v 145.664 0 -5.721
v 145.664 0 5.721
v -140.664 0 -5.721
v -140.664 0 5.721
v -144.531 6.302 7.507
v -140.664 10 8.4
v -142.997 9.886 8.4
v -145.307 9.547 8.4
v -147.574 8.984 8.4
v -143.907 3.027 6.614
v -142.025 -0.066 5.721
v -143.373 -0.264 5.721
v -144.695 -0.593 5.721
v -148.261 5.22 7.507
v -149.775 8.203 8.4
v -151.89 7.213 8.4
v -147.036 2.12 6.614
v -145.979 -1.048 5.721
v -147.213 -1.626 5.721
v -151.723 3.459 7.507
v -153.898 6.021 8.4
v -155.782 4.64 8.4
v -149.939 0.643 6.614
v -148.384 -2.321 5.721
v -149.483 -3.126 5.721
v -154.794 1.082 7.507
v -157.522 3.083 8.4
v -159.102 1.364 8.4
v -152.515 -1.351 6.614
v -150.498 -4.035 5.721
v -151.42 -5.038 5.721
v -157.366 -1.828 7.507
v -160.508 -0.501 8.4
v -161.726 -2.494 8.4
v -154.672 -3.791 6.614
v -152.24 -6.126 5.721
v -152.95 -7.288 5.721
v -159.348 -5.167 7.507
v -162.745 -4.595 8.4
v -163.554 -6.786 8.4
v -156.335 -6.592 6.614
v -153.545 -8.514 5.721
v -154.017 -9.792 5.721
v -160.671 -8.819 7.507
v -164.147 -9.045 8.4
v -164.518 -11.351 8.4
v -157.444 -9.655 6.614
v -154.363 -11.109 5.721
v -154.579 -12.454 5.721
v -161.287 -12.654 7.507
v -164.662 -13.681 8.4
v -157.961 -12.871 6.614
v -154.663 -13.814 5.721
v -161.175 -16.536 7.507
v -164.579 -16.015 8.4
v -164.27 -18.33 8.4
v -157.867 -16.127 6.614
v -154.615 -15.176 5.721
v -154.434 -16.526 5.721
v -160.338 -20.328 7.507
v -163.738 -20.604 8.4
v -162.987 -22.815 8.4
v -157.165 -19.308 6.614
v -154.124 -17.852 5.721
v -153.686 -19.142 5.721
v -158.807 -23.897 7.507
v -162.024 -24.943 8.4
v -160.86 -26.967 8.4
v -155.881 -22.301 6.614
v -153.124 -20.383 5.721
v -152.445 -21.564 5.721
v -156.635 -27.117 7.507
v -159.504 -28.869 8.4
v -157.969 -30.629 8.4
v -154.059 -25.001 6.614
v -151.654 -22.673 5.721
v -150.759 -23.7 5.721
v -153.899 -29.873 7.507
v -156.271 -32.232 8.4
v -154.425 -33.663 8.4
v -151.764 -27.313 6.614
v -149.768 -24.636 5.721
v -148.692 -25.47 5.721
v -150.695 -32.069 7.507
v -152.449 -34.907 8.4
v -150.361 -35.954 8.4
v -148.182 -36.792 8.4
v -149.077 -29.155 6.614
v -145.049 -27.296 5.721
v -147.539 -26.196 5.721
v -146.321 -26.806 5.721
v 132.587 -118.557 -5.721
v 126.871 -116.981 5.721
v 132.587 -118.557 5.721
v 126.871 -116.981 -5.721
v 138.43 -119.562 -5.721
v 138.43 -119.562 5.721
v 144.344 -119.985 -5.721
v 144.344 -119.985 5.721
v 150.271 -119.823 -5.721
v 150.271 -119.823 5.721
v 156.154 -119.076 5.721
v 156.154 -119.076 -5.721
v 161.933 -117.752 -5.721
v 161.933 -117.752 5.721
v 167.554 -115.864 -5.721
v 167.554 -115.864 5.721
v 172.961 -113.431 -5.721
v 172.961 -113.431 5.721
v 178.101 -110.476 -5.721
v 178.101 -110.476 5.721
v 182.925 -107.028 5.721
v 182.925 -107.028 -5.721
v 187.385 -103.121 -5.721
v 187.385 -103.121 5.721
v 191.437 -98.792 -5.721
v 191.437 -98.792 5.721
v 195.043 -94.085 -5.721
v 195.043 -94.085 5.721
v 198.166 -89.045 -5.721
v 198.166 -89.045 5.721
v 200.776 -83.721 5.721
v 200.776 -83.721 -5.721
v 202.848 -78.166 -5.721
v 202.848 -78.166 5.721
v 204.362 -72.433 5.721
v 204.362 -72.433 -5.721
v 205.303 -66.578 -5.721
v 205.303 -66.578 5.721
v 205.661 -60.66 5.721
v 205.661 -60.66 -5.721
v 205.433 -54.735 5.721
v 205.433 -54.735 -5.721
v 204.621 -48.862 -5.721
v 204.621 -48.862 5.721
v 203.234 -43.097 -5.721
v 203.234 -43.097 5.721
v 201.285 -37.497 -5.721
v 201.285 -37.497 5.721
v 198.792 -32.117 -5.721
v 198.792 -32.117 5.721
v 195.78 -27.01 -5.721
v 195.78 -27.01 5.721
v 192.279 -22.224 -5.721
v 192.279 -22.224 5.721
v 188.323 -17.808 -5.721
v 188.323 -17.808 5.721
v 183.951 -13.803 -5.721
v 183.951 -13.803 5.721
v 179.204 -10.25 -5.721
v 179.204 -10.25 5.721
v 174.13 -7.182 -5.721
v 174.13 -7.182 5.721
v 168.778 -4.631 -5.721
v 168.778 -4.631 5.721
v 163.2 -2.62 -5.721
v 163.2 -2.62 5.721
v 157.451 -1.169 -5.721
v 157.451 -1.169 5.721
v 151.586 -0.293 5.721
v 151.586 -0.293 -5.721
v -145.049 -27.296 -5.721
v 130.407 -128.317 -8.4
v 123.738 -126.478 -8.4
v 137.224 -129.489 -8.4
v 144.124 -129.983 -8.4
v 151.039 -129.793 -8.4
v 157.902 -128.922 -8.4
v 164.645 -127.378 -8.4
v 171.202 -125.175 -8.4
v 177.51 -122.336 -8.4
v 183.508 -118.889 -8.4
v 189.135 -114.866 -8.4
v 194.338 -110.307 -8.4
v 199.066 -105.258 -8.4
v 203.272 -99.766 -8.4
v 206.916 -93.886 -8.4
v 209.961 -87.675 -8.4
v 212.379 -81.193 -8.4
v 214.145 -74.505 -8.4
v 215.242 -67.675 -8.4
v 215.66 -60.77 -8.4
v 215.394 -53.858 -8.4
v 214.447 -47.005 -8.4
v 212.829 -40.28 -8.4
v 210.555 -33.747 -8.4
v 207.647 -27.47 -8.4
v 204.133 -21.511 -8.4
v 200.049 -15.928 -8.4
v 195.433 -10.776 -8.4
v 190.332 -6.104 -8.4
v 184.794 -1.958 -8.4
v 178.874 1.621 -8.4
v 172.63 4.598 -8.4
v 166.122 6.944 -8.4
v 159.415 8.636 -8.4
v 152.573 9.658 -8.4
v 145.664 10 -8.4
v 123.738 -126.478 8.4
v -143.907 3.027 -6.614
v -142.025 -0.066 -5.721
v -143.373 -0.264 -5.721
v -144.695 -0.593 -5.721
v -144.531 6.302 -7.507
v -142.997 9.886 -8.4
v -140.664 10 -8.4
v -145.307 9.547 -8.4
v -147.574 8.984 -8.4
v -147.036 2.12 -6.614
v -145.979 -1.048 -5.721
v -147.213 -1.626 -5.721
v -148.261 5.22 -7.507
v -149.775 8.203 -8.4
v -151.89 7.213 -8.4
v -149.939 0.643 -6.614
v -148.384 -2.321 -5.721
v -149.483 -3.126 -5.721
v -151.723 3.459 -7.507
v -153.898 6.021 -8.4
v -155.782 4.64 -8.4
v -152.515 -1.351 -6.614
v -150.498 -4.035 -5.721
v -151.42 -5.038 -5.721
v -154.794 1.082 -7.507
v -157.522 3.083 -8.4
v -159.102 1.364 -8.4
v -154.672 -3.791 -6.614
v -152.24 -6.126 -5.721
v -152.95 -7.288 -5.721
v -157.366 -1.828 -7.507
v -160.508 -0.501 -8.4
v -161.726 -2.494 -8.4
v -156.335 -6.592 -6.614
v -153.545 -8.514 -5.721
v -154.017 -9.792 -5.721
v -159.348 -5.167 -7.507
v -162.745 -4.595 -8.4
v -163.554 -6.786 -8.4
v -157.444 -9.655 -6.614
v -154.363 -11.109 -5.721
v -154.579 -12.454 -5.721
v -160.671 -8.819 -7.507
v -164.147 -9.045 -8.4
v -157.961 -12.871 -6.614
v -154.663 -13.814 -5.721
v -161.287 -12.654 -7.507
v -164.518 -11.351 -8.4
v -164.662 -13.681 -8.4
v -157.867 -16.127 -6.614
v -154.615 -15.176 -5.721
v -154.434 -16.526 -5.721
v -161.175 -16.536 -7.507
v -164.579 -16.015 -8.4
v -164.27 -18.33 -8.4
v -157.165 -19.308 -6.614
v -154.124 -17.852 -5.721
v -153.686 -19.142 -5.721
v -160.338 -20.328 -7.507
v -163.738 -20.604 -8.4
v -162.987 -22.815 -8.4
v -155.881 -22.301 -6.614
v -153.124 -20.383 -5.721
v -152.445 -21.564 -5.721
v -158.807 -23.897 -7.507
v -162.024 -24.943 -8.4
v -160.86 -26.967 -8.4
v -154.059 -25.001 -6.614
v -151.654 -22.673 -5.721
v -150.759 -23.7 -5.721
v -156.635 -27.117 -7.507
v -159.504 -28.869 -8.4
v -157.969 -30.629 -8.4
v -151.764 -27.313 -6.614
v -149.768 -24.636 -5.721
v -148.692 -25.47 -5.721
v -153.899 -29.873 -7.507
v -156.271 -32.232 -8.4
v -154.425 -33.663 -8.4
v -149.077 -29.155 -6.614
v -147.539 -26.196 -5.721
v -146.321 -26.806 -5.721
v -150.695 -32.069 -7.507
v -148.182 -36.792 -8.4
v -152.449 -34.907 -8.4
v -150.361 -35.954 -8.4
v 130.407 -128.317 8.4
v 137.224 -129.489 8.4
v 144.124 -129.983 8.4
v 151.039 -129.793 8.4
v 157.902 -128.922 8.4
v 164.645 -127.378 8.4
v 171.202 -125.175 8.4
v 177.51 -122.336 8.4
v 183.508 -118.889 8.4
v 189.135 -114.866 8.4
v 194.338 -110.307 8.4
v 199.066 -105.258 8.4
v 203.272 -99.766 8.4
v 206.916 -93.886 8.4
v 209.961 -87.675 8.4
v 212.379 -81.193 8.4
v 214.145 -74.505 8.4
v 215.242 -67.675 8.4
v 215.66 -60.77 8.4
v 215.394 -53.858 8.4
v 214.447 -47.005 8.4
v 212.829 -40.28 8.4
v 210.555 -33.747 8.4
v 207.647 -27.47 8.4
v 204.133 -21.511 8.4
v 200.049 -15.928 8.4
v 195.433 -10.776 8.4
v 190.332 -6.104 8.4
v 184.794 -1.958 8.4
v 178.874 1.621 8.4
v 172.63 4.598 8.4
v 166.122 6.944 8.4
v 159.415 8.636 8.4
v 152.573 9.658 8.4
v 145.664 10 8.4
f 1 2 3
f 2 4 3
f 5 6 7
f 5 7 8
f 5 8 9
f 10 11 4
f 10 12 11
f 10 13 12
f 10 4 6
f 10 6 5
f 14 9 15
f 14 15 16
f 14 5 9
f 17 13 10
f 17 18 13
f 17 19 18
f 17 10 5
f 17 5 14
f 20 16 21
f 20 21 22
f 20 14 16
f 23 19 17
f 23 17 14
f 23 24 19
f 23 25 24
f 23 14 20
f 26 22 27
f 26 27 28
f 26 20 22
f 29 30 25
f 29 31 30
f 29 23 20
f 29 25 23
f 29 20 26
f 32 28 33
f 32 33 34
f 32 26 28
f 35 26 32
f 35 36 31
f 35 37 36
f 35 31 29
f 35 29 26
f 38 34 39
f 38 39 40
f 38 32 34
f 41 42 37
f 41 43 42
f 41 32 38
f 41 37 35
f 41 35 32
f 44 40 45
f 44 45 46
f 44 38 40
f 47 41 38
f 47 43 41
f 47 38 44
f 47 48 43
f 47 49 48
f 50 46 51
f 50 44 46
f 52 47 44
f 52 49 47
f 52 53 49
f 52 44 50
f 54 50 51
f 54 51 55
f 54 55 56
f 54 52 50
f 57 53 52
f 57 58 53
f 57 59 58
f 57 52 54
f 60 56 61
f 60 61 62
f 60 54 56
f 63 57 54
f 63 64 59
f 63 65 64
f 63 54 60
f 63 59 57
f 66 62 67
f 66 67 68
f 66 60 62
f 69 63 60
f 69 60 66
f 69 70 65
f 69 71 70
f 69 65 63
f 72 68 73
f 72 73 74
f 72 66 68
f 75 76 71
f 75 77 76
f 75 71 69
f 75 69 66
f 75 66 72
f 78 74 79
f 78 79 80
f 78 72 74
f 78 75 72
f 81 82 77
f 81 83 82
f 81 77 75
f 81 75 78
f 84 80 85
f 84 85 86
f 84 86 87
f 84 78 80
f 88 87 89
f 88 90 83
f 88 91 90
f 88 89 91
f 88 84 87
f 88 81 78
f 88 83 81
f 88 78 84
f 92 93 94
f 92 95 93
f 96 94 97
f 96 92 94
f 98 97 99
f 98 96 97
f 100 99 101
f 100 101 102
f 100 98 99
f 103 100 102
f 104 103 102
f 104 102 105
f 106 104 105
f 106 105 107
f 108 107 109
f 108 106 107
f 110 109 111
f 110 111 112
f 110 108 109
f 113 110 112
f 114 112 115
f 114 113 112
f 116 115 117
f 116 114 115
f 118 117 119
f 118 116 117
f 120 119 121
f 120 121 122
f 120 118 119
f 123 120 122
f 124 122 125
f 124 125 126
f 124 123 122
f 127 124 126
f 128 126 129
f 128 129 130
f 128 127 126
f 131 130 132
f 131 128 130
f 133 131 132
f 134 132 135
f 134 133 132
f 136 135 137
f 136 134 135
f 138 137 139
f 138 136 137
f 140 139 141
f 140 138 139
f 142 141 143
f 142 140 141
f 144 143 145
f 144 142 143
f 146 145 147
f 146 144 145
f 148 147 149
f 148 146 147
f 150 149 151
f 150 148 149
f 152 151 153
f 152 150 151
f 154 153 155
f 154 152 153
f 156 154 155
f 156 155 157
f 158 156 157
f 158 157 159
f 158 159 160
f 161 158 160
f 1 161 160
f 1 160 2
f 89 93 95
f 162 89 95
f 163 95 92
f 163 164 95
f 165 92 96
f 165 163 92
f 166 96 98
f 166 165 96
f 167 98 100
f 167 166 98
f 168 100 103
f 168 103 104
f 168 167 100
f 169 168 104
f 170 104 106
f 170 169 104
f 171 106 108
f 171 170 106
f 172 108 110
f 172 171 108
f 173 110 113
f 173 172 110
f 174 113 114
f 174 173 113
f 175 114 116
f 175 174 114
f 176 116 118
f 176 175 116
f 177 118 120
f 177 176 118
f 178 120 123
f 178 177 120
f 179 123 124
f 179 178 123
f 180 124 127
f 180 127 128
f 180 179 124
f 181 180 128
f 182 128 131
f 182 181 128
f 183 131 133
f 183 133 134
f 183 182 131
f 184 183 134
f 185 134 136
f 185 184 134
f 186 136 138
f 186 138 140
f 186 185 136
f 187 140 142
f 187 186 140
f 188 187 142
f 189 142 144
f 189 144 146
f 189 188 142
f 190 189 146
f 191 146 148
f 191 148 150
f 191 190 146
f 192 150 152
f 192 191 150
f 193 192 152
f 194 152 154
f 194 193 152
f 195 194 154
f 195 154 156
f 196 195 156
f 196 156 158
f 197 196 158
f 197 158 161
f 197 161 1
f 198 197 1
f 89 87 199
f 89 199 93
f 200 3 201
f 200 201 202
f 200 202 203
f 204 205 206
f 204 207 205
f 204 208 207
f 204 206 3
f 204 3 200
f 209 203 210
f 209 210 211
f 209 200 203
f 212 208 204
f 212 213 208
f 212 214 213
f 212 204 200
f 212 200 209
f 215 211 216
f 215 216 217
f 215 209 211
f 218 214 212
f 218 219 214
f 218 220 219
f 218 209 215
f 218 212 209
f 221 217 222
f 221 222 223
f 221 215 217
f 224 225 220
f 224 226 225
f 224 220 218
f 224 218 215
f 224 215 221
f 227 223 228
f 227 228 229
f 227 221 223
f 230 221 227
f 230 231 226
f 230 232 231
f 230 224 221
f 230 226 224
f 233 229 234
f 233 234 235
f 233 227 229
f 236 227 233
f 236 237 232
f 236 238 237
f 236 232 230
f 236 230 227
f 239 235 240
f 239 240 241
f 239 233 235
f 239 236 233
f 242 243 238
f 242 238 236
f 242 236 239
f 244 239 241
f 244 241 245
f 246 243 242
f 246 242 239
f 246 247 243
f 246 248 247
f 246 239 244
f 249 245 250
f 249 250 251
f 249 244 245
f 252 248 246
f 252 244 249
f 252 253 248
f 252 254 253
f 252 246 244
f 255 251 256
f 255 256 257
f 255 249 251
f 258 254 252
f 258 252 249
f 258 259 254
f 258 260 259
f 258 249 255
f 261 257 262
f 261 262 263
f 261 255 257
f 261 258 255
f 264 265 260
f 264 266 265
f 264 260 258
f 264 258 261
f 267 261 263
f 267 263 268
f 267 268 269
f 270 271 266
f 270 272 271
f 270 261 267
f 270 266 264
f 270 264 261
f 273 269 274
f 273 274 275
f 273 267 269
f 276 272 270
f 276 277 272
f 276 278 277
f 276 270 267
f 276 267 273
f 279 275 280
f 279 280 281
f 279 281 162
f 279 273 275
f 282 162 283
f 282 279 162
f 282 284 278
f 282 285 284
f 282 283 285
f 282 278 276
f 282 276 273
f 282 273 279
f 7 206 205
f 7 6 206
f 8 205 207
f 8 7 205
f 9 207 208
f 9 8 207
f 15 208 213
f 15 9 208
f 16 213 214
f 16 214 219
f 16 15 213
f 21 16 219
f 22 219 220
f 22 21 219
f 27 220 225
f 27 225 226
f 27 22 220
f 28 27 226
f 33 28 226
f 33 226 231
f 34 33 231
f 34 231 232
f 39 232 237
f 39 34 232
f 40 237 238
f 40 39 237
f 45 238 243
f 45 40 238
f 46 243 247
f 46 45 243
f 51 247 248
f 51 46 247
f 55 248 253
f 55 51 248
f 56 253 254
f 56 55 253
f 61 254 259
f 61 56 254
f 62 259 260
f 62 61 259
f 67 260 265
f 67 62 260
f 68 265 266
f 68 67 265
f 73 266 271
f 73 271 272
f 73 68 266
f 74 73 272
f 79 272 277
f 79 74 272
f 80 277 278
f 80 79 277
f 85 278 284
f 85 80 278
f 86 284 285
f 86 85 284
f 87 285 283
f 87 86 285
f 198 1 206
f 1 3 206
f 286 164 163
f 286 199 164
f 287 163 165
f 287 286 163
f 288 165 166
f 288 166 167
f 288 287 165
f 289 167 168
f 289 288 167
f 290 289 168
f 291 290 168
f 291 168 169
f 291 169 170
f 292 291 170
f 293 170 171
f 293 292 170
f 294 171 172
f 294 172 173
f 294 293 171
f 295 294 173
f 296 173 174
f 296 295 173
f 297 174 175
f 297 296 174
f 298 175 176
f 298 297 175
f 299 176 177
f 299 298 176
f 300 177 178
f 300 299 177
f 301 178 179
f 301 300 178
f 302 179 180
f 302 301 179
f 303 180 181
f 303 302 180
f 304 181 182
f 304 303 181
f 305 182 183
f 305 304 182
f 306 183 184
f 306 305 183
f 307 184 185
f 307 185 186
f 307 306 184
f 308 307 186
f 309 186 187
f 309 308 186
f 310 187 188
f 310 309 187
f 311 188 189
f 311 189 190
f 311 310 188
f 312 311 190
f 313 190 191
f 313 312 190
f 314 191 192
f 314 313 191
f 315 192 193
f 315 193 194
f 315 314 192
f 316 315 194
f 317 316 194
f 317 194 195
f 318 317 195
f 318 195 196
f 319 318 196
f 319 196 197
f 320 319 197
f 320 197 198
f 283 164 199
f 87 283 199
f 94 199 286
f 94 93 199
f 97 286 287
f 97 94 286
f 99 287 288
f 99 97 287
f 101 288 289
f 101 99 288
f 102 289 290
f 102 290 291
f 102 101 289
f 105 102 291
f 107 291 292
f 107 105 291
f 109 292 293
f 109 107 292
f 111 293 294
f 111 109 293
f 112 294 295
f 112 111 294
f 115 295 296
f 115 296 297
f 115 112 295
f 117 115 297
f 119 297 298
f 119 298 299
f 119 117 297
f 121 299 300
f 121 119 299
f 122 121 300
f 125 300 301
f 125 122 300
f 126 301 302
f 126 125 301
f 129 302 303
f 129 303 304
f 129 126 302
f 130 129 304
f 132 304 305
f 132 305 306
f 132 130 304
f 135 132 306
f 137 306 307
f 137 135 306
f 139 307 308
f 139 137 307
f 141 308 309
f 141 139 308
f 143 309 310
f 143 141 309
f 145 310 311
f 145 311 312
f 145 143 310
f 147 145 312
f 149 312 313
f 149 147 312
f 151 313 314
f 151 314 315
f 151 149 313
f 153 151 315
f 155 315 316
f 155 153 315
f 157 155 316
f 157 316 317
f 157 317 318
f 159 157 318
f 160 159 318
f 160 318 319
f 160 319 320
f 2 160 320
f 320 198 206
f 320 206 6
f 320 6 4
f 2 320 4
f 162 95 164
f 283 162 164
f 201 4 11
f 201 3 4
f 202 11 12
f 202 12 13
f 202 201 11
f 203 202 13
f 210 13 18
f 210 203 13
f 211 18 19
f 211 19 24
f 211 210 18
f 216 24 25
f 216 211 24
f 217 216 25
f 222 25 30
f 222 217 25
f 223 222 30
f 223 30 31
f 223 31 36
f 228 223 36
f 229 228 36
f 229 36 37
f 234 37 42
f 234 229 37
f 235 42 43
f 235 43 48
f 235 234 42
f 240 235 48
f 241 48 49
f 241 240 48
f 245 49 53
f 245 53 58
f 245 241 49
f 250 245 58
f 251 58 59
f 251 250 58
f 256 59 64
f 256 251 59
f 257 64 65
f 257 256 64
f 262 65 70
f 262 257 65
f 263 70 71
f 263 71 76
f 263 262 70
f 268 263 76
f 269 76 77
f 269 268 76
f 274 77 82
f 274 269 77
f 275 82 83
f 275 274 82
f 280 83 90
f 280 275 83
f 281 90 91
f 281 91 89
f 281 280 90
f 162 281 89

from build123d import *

# Parameters (mm, degrees)
RESSALTO_EXTRUS_O1_DEPTH = 5


with BuildPart() as part:
    # Varredura1: sweep along a path in Esboço1
    with BuildLine(Plane.XY) as varredura1_path:
        Line((0, 0), (-140.664241345, 0))
        ThreePointArc((-140.664241345, 0), (-154.486995682, -11.779310345), (-145.049390997, -27.295505351))
        Line((-145.049390997, -27.295505351), (126.870742838, -116.980737218))
        ThreePointArc((126.870742838, -116.980737218), (204.904617075, -69.517241379), (145.664241345, 0))
        Line((145.664241345, 0), (5, 0))
    # Esboço2 → Varredura1 (sweep)
    with BuildSketch(Plane(origin=(0, 0, 0), x_dir=(0, 0, -1), z_dir=(1, 0, 0))):
        Polygon((-8.4, 10), (8.4, 10), (5.720508076, 0), (-5.720508076, 0), align=None)
    sweep(path=varredura1_path.line)

    # Esboço3 → Ressalto-extrusão1 (add)
    with BuildSketch(Plane(origin=(0, 0, 0), x_dir=(0, 0, -1), z_dir=(1, 0, 0))):
        Polygon((-8.4, 10), (-5.720508076, 0), (5.720508076, 0), (8.4, 10), align=None)
    extrude(amount=RESSALTO_EXTRUS_O1_DEPTH)


solid = part.part
